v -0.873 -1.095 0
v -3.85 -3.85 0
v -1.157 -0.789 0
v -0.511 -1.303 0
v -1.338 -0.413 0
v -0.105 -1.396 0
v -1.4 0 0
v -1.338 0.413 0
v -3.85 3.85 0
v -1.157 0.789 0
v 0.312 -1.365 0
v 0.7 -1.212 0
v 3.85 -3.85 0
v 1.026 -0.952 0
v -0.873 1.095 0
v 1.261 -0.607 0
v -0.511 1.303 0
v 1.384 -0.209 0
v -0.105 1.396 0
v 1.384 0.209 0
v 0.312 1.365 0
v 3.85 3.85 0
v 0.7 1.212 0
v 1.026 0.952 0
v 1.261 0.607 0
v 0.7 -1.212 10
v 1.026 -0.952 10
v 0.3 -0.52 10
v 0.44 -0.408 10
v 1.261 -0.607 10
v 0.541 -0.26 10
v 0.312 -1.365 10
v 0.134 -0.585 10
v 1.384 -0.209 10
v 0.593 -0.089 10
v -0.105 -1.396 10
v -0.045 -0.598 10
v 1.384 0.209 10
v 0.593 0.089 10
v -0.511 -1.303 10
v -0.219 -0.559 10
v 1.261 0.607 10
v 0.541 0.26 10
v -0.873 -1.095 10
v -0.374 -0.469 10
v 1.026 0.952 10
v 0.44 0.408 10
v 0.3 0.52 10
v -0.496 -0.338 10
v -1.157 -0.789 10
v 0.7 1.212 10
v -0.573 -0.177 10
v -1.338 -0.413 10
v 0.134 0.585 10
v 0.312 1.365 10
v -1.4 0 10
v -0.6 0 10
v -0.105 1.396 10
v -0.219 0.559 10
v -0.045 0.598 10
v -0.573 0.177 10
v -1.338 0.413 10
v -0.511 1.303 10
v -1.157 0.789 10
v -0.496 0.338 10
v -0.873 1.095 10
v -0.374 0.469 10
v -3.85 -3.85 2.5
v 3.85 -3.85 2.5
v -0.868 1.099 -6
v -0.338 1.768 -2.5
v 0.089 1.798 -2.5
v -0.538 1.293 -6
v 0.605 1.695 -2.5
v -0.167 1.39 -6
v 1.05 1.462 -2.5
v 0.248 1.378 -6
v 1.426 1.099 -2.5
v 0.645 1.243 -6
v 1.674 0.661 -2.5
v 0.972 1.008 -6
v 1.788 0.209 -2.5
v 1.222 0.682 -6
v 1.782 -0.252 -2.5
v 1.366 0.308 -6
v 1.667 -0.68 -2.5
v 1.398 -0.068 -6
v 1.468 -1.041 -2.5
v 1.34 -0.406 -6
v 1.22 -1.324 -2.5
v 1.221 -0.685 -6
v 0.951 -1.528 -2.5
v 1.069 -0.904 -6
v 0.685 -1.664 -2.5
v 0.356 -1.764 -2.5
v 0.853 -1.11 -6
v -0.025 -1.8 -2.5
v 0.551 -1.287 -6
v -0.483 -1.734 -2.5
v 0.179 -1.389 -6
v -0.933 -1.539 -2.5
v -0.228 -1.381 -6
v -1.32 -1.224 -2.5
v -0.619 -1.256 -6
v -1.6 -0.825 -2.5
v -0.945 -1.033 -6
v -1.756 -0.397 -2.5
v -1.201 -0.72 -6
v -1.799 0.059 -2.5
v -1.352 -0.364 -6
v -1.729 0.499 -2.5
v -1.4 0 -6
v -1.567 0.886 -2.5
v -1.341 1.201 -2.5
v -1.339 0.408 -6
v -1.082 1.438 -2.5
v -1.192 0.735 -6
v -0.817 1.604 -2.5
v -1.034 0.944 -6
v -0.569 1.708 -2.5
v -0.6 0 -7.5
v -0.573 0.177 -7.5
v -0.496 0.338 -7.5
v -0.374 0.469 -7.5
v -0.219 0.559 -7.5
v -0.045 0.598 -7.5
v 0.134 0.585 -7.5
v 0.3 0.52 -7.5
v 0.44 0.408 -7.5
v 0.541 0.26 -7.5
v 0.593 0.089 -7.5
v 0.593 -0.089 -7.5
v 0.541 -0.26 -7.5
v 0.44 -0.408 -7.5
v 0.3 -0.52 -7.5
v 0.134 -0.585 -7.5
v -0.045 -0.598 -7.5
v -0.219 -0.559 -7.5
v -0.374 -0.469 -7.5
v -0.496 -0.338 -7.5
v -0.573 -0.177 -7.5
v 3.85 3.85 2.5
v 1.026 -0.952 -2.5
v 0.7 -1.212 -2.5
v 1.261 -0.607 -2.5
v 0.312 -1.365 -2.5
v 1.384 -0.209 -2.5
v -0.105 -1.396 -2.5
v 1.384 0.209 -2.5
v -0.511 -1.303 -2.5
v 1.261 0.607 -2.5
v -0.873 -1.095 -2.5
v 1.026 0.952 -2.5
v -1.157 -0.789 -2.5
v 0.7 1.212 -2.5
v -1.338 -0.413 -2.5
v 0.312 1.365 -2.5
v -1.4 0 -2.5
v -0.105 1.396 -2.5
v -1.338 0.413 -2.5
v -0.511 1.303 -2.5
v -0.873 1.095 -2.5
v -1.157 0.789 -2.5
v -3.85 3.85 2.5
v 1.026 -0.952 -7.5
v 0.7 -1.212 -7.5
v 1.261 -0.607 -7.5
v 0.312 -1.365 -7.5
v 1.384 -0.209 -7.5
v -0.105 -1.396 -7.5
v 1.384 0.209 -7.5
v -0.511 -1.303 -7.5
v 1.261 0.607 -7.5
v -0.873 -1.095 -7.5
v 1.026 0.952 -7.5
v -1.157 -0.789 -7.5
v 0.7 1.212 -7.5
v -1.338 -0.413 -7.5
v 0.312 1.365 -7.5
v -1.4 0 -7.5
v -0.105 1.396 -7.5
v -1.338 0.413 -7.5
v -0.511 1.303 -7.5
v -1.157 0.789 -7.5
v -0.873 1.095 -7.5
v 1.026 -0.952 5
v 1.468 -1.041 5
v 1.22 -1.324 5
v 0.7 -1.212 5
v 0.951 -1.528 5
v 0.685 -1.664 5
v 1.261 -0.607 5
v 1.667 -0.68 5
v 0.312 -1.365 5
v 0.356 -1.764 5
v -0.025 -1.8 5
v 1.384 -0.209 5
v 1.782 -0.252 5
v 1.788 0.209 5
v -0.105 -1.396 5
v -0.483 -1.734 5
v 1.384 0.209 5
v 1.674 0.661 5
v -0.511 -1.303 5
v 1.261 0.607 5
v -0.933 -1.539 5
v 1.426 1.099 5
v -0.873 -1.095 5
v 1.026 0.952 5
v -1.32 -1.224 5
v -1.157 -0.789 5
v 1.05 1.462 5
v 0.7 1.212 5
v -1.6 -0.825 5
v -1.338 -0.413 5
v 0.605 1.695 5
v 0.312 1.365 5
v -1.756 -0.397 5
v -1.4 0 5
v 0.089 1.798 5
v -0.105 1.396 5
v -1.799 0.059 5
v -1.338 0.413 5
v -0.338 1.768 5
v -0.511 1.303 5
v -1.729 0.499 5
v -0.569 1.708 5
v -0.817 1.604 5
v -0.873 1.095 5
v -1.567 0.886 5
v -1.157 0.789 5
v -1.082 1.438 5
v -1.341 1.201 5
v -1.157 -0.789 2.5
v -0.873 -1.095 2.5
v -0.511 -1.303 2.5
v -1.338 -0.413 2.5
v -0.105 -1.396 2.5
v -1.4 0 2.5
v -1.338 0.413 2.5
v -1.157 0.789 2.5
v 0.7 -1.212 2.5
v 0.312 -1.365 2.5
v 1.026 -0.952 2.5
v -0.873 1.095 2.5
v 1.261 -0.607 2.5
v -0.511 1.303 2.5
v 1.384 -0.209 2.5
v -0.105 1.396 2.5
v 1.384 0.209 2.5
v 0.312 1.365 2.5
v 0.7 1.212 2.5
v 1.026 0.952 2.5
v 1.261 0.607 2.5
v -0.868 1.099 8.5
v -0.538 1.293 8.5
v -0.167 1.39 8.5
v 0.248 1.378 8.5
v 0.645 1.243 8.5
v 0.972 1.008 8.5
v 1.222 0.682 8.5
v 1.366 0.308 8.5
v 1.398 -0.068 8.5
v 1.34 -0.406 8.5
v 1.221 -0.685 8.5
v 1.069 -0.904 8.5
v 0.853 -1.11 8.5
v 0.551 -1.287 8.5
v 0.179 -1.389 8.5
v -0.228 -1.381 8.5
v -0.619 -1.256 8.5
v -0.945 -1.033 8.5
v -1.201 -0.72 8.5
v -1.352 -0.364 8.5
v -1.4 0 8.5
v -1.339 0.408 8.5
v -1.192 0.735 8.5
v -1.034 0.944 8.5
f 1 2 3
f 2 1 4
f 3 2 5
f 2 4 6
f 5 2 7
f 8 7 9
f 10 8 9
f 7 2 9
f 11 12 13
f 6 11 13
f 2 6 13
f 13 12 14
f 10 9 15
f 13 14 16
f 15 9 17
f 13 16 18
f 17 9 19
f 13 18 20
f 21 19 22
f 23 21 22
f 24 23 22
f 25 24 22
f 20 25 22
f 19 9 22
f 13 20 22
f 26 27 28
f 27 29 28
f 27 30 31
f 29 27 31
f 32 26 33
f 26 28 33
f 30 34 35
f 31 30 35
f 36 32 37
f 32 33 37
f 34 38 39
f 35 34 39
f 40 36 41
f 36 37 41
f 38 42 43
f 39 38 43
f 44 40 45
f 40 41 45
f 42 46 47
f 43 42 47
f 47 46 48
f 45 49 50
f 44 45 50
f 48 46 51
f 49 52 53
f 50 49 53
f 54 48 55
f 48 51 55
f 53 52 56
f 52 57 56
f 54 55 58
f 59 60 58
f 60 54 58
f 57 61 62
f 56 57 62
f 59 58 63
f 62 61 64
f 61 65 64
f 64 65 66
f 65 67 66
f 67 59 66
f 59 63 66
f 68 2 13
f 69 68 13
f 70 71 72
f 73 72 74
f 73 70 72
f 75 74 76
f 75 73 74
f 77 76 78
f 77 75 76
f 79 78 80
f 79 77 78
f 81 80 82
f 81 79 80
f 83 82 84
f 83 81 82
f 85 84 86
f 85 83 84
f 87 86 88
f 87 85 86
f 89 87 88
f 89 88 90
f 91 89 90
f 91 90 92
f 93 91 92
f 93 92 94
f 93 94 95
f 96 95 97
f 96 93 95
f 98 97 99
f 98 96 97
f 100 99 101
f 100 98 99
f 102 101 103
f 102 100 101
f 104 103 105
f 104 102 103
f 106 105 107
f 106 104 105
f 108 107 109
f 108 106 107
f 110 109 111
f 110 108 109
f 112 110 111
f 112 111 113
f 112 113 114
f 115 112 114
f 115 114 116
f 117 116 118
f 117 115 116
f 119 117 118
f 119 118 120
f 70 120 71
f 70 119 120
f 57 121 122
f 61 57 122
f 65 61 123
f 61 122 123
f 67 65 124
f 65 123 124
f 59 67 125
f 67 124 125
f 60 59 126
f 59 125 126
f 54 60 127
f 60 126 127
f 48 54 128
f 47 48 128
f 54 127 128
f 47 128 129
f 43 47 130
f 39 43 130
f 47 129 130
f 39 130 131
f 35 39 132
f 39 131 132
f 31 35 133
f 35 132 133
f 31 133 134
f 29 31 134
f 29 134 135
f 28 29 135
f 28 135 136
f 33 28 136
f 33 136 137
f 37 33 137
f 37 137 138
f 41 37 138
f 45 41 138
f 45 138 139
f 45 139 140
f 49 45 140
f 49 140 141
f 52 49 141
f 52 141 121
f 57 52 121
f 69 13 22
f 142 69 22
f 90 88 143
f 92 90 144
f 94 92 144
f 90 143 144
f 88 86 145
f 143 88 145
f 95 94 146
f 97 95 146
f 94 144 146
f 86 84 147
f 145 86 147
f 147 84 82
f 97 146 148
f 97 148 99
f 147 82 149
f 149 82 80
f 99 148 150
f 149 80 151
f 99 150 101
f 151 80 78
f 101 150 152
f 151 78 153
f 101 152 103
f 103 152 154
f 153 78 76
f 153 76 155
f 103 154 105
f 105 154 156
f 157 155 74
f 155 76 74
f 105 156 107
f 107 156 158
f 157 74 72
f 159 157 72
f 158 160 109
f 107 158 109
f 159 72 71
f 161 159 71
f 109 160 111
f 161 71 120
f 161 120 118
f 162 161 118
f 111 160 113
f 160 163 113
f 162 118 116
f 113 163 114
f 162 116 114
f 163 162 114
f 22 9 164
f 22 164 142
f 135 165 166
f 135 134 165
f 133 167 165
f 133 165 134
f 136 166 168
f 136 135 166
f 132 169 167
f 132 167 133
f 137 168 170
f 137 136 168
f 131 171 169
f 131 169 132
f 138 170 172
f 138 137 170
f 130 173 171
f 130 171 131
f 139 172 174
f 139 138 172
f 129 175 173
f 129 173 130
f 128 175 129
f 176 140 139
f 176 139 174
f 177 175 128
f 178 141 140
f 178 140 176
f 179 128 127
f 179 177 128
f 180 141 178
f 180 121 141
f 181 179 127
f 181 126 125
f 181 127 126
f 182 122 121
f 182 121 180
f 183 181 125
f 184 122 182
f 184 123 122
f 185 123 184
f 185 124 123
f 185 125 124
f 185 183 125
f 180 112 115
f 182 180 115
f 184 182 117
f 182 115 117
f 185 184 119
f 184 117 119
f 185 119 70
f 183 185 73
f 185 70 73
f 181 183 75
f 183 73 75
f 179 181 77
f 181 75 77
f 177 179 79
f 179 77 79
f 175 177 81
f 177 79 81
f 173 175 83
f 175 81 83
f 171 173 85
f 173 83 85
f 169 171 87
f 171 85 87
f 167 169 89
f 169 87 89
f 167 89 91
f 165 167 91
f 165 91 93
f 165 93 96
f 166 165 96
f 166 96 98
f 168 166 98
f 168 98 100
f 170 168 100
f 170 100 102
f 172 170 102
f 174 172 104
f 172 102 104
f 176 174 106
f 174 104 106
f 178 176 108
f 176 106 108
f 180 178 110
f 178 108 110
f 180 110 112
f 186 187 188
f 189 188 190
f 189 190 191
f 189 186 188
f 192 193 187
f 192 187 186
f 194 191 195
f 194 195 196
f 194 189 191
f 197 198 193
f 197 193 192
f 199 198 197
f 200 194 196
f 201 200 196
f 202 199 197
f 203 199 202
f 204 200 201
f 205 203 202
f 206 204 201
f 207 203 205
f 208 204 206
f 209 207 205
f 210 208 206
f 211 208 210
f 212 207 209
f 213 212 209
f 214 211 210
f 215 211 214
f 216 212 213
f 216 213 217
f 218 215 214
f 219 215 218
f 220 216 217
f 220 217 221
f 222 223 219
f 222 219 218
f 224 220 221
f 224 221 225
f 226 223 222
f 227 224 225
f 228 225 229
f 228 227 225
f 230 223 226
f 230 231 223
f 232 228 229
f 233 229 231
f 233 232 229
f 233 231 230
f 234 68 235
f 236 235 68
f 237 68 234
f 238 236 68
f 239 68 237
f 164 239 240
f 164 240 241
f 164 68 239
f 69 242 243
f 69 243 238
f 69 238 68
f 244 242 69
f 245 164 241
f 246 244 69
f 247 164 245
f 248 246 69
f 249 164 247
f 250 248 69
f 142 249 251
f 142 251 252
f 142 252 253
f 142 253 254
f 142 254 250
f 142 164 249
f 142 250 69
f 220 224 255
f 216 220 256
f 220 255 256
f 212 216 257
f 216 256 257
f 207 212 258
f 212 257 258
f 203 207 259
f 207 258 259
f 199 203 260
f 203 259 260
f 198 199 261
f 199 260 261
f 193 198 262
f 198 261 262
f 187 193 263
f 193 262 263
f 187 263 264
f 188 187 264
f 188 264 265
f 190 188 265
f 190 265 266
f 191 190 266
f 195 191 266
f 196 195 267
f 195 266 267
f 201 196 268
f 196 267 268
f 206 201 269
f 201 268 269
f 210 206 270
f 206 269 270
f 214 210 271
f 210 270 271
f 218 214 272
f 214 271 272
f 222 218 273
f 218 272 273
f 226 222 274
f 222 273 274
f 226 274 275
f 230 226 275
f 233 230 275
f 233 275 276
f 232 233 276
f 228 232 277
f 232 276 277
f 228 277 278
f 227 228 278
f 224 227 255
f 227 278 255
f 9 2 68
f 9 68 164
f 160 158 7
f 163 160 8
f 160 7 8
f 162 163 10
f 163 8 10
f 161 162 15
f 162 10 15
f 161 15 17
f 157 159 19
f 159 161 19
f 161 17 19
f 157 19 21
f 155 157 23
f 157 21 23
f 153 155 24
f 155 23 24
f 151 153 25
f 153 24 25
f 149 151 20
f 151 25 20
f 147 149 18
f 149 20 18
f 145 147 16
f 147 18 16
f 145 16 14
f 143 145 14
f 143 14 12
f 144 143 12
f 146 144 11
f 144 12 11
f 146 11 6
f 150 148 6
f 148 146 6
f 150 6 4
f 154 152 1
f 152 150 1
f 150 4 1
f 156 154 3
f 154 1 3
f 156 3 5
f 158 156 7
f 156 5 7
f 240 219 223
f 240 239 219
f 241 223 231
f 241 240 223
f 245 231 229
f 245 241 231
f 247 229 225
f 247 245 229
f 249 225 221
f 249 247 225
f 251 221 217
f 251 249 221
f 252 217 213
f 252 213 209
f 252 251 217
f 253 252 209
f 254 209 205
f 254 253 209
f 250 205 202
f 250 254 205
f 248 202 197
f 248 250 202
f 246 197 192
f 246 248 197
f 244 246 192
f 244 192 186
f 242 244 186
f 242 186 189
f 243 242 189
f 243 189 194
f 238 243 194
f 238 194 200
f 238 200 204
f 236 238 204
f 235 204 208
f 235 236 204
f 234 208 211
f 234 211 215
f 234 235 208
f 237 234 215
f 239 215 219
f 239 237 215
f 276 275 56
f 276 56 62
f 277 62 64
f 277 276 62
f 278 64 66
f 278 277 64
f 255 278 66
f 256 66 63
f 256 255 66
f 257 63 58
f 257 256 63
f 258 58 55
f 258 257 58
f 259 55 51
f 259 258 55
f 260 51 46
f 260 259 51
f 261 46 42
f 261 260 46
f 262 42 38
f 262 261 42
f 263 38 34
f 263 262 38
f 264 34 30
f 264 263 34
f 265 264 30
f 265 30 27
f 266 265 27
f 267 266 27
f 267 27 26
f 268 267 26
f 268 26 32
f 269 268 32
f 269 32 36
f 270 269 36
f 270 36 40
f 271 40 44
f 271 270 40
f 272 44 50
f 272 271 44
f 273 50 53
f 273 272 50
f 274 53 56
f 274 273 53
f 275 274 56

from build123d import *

# Parameters (mm, degrees)
CROQUIS1_W              = 7.7
CROQUIS1_H              = 7.7
SALIENTE_EXTRUIR1_DEPTH = 2.5
CROQUIS2_R              = 1.4
SALIENTE_EXTRUIR2_DEPTH = 7.5
CROQUIS6_R              = 0.6
CORTAR_EXTRUIR1_DEPTH   = 19.327438542


with BuildPart() as part:
    # Croquis1 → Saliente-Extruir1 (new body)
    with BuildSketch(Plane.XY):
        Rectangle(CROQUIS1_W, CROQUIS1_H)
    extrude(amount=SALIENTE_EXTRUIR1_DEPTH)

    # Croquis2 → Saliente-Extruir2 (add)
    with BuildSketch(Plane(origin=(0, 0, 0), x_dir=(-1, 0, 0), z_dir=(0, 0, -1))):
        Circle(CROQUIS2_R)
    saliente_extruir2 = extrude(amount=SALIENTE_EXTRUIR2_DEPTH)

    # Recubrir2: read off the stored shape, not the designer's step
    # Recubrir2: loft between two sections, ruled curve by curve
    recubrir2_from = [
        Edge.make_bspline([(-0.33839724, 1.767904779, -2.5), (3.197412318, 2.44469926, -2.5), (3.874206798, -1.091110298, -2.5), (0.33839724, -1.767904779, -2.5), (-3.197412318, -2.44469926, -2.5), (-3.874206798, 1.091110298, -2.5), (-0.33839724, 1.767904779, -2.5)], [0, 0, 0, 0, 0.5, 0.5, 0.5, 1, 1, 1, 1], 3, [1, 0.333333333, 0.333333333, 1, 0.333333333, 0.333333333, 1]),
    ]
    recubrir2_to = [
        Edge.make_bspline([(-0.867767345, 1.09862634, -6), (1.329485334, 2.83416103, -6), (3.065020025, 0.636908351, -6), (0.867767345, -1.09862634, -6), (-1.329485334, -2.83416103, -6), (-3.065020025, -0.636908351, -6), (-0.867767345, 1.09862634, -6)], [0, 0, 0, 0, 0.5, 0.5, 0.5, 1, 1, 1, 1], 3, [1, 0.333333333, 0.333333333, 1, 0.333333333, 0.333333333, 1]),
    ]
    recubrir2 = Solid(Shell([*[Face.make_surface_from_curves(recubrir2_from[k], recubrir2_to[k]) for k in range(1)], Face(Wire(recubrir2_from)), Face(Wire(recubrir2_to))]))
    add(recubrir2)

    # Simetría2: Saliente-Extruir2, Recubrir2 across plane
    add(saliente_extruir2.mirror(Plane(origin=(0, 0, 1.25), x_dir=(1, 0, 0), z_dir=(0, 0, -1))))
    add(recubrir2.mirror(Plane(origin=(0, 0, 1.25), x_dir=(1, 0, 0), z_dir=(0, 0, -1))))

    # Croquis6 → Cortar-Extruir1 (cut, through all)
    with BuildSketch(Plane(origin=(0, 0, -7.5), x_dir=(-1, 0, 0), z_dir=(0, 0, -1))):
        Circle(CROQUIS6_R)
    extrude(amount=-CORTAR_EXTRUIR1_DEPTH, mode=Mode.SUBTRACT)


solid = part.part
